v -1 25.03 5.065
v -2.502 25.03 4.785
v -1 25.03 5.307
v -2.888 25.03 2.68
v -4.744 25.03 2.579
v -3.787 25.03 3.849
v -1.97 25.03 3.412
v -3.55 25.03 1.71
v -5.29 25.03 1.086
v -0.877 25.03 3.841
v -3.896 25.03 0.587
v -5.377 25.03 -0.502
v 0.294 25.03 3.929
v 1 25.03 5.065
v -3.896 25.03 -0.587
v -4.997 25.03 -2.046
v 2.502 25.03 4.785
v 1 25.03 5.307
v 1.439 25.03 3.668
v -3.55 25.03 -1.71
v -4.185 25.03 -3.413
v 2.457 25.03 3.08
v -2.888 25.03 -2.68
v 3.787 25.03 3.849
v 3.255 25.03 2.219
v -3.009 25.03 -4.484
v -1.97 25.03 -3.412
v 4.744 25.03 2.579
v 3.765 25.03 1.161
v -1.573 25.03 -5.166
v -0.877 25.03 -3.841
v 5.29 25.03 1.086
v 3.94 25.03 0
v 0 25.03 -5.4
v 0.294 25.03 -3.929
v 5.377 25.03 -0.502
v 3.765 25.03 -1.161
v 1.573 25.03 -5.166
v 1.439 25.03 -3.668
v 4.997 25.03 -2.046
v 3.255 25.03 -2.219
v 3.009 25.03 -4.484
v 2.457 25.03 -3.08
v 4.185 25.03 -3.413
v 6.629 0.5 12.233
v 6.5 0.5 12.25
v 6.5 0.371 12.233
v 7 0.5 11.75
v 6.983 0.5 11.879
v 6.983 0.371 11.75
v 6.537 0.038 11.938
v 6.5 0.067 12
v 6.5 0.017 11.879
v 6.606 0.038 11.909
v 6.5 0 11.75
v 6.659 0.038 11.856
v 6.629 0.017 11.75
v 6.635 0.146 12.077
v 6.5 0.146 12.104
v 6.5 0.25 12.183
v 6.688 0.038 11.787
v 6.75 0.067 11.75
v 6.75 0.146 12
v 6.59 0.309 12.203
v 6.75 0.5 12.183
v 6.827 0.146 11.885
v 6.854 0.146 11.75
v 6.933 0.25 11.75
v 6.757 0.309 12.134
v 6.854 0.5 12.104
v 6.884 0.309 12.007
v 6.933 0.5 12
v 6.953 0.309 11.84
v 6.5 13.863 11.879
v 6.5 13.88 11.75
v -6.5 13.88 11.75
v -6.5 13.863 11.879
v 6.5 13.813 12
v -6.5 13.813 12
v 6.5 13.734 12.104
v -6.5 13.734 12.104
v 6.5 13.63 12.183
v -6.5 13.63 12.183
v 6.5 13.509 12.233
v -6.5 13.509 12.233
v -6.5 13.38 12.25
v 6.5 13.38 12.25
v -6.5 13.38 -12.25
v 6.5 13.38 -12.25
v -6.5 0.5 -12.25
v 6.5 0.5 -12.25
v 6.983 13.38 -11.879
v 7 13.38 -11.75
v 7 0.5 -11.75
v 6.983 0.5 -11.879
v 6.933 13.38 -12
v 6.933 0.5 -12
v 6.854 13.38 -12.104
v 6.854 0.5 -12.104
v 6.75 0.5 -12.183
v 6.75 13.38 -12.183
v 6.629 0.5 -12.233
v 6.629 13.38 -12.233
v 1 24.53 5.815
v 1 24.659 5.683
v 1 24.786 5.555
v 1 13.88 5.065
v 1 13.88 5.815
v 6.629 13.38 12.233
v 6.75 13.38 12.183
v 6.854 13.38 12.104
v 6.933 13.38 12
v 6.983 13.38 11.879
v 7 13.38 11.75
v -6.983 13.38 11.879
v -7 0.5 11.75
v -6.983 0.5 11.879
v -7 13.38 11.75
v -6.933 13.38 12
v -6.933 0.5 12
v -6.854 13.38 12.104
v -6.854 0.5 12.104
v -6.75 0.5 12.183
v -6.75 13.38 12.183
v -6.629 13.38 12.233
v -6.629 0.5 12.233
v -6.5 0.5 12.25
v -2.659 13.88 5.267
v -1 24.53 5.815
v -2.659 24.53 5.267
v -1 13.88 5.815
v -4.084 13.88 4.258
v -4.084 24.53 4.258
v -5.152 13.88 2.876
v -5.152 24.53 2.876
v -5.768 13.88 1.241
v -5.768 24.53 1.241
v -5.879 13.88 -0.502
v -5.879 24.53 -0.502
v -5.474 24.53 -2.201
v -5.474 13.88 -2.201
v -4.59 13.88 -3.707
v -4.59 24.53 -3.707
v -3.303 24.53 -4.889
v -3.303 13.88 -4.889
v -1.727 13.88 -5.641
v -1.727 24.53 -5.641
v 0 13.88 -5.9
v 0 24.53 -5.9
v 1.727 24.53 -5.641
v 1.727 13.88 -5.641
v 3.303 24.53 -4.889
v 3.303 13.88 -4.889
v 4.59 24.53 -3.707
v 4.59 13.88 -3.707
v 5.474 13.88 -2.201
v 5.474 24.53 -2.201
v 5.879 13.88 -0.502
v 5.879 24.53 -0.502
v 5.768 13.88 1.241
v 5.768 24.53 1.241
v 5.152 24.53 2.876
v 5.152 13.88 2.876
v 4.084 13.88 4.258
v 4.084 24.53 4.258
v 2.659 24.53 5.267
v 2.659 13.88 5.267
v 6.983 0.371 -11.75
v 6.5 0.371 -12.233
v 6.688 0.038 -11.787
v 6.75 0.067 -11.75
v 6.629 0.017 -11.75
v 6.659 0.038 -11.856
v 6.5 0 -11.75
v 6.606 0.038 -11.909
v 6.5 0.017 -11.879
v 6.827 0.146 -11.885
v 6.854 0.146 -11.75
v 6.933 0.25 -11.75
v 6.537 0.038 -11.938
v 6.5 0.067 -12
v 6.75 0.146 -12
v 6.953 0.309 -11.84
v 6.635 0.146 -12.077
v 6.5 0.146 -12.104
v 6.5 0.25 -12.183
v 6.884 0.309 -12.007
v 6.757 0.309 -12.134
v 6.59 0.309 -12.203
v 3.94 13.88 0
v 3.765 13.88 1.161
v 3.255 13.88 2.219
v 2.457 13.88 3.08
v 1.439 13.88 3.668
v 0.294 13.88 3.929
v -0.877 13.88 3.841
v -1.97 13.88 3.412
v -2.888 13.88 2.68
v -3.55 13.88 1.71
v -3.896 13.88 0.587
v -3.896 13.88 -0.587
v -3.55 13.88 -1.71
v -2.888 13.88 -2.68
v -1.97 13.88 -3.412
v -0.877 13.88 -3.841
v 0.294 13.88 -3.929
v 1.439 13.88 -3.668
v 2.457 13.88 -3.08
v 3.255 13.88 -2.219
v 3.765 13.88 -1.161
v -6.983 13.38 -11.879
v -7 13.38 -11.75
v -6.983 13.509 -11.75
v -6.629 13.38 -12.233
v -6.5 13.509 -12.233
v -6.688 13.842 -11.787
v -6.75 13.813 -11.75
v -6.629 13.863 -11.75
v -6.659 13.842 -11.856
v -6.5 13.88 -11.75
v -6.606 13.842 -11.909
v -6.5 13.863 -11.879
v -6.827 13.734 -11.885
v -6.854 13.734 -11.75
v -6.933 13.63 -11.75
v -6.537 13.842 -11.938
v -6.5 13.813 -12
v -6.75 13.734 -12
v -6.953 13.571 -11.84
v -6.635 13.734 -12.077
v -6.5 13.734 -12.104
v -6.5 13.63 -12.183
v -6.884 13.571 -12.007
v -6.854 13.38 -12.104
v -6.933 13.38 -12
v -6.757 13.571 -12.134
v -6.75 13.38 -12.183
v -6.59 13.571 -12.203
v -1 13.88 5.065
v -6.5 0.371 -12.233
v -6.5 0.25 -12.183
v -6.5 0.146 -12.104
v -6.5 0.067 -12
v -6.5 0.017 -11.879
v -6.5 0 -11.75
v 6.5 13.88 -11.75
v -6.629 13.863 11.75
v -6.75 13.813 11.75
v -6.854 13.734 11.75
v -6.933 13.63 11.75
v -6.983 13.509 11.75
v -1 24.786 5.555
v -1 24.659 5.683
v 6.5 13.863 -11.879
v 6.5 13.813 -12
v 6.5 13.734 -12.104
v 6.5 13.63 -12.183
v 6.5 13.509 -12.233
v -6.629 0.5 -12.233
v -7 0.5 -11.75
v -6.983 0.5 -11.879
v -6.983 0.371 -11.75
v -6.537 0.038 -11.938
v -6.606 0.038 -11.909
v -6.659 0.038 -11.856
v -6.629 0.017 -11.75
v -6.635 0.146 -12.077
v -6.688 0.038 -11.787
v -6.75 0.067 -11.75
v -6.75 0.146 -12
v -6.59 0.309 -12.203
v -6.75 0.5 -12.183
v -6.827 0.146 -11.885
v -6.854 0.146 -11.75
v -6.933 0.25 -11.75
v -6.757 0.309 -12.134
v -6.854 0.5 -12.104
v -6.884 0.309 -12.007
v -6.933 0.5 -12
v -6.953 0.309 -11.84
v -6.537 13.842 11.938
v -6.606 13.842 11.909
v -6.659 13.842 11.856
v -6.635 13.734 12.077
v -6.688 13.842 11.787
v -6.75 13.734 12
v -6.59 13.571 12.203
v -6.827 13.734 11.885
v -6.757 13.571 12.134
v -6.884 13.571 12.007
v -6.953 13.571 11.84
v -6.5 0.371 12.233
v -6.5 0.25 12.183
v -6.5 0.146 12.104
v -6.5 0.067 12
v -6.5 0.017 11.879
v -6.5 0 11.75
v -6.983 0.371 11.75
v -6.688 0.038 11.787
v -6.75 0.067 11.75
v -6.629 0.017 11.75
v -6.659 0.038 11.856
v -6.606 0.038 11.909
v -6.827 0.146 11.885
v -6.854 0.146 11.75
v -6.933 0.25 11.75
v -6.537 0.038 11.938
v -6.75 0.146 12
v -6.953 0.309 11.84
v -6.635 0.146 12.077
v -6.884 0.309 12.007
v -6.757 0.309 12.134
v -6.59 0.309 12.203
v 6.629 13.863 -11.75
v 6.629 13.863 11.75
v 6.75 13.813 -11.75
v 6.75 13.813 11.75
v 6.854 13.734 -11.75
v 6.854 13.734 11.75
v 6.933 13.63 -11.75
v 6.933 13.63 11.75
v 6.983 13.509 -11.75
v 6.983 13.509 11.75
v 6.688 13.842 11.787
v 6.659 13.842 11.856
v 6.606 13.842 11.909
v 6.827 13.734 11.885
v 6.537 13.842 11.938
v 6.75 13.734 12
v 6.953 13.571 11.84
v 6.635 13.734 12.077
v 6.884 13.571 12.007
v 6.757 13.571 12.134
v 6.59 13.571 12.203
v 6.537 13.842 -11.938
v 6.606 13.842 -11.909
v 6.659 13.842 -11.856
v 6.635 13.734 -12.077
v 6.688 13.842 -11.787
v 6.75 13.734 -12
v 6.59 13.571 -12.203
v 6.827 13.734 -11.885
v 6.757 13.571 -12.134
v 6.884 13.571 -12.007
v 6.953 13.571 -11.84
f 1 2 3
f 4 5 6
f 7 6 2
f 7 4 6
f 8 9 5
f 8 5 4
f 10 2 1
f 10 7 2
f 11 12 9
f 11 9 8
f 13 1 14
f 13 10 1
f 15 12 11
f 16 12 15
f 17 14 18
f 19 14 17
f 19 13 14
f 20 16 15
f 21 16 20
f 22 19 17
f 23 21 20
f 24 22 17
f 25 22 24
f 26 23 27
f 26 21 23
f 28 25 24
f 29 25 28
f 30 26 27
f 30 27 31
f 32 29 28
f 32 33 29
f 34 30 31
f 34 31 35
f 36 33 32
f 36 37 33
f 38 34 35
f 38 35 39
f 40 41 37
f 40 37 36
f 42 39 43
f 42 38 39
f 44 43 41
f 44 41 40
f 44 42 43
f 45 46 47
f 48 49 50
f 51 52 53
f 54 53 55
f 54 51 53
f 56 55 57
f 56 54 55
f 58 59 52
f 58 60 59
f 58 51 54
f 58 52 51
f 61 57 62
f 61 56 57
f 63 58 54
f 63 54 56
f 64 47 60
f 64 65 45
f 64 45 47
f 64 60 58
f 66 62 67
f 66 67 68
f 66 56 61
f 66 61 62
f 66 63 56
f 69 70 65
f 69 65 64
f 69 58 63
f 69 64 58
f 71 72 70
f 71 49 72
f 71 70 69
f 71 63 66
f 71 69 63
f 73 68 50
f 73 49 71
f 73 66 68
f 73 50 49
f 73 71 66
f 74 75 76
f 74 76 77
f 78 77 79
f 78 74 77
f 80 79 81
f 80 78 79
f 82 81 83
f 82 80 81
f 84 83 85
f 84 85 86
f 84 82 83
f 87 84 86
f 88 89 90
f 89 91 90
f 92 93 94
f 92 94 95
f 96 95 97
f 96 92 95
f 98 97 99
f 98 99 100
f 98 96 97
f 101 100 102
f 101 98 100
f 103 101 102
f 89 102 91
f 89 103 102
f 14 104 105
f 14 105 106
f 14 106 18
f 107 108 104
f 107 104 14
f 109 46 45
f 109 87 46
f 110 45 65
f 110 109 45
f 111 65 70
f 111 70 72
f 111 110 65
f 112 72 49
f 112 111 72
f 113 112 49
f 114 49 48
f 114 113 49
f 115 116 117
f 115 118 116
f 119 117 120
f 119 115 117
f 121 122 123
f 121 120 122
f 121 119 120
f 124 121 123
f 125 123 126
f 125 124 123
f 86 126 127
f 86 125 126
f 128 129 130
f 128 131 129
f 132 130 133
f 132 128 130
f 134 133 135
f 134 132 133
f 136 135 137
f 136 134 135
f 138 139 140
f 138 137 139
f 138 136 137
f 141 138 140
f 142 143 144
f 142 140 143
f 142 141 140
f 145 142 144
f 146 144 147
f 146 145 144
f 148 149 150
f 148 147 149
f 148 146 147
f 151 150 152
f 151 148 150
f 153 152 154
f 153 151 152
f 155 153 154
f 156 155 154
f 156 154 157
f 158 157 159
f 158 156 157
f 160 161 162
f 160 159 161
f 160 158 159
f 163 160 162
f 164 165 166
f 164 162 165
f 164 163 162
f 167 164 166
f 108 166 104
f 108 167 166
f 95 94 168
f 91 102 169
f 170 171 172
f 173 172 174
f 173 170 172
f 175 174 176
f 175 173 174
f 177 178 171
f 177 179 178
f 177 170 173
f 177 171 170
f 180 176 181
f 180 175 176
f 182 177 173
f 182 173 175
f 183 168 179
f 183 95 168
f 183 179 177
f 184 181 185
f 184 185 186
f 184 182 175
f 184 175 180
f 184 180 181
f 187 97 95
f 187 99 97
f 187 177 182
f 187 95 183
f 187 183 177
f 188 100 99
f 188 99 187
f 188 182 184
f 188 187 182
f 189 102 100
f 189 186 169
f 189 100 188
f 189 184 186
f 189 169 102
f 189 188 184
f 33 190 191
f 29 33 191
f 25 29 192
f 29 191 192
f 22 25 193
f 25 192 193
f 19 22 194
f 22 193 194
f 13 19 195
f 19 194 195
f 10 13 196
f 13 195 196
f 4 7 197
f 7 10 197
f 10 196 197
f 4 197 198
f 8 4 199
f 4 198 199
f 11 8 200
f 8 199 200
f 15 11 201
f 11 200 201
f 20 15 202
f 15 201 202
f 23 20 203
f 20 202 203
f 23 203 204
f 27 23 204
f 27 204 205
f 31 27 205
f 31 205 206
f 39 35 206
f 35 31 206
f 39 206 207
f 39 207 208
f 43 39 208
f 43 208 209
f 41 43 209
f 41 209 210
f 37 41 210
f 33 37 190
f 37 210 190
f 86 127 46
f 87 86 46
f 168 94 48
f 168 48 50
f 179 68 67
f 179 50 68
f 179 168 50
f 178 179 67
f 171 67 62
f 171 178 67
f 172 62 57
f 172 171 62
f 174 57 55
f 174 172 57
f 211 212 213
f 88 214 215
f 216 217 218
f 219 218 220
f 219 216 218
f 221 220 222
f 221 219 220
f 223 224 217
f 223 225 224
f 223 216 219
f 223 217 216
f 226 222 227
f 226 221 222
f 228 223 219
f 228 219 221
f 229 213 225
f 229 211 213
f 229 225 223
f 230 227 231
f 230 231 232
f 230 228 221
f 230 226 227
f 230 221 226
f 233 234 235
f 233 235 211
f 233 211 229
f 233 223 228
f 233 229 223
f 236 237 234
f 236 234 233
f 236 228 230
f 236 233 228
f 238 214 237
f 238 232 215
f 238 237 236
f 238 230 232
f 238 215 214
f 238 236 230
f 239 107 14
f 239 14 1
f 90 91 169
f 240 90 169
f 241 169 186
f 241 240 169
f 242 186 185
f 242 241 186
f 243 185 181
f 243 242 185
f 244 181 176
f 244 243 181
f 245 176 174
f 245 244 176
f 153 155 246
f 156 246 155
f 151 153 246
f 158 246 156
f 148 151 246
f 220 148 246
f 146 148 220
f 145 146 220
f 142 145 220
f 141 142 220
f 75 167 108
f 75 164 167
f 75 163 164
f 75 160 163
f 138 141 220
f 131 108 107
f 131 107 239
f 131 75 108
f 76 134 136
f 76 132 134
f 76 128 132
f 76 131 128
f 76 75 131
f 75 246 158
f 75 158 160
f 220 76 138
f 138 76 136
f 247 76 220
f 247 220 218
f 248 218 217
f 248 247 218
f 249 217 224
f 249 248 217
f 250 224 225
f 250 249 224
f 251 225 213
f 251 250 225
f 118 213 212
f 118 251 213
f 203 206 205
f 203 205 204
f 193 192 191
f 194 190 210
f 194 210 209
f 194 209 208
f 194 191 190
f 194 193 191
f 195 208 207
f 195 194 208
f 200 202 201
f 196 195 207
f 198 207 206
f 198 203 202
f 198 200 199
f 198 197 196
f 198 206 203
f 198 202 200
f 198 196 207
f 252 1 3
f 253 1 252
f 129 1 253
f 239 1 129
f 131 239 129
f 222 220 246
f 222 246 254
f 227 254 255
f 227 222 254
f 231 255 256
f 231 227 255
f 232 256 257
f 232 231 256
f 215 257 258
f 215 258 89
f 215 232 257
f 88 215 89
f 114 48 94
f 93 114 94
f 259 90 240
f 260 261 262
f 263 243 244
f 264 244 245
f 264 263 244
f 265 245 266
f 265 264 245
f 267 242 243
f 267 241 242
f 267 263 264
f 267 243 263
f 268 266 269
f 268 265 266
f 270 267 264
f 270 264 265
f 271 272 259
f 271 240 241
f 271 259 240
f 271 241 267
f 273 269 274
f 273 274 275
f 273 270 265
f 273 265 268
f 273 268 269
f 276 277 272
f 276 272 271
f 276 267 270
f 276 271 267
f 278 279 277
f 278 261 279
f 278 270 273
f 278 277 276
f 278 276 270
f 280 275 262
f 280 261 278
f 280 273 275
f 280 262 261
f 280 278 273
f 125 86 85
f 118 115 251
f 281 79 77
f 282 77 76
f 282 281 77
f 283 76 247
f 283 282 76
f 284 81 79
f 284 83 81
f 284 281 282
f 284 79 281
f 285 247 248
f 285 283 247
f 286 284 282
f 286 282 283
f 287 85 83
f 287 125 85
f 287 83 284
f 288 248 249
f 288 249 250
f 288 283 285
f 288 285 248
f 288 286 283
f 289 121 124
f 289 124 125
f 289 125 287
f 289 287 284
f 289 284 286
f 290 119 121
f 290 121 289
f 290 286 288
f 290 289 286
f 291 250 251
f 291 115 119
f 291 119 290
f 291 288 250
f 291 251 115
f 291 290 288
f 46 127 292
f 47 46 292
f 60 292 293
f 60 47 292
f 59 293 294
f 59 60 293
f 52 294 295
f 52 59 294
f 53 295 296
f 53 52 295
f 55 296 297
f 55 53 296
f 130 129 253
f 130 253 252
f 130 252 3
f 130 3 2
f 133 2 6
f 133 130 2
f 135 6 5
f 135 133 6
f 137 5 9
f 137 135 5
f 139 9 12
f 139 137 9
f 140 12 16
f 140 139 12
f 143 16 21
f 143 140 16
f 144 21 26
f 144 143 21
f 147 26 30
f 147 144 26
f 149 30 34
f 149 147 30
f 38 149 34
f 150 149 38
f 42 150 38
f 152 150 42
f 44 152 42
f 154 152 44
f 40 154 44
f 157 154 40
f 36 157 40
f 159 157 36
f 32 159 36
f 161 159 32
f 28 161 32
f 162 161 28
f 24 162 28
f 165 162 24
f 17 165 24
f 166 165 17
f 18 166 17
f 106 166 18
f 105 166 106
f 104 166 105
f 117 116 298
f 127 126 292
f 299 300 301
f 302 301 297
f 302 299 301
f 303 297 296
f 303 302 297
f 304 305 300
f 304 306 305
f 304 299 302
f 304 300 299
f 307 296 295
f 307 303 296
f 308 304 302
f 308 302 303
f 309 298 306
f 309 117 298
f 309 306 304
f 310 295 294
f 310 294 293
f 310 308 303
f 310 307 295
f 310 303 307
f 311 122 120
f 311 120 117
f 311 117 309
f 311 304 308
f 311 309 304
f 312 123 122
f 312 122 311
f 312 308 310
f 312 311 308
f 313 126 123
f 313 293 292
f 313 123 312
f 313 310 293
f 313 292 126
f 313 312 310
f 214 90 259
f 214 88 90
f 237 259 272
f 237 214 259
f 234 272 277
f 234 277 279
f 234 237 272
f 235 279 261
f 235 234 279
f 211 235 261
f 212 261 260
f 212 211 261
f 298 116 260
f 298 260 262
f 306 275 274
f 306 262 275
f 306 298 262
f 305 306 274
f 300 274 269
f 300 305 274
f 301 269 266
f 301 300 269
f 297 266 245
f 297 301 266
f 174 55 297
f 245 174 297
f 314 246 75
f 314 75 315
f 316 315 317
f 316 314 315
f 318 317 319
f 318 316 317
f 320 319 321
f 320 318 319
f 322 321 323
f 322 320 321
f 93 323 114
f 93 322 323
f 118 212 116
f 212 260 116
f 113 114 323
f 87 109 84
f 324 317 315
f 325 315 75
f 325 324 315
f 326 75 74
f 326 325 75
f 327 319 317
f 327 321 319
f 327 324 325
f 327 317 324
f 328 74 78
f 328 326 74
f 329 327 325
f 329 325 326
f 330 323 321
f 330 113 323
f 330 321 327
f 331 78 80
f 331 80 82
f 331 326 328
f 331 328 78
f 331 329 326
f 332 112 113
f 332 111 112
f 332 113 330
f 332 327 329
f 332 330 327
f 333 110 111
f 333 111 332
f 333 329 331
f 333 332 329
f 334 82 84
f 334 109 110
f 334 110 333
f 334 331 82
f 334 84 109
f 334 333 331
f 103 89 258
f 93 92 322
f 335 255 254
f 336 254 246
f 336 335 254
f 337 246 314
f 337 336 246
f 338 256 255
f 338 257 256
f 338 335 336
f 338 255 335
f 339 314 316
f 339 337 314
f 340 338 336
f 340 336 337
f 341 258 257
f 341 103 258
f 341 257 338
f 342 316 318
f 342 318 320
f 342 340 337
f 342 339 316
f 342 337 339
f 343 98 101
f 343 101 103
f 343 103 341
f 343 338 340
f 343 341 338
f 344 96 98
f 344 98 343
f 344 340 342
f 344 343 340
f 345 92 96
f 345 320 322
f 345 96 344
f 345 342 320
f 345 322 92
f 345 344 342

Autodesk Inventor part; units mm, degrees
ref_plane "YZ Plane" through (0, 0, 0) normal (1, 0, 0) x (0, 1, 0)
ref_plane "XZ Plane" through (0, 0, 0) normal (0, 1, 0) x (-1, 0, 0)
ref_plane "XY Plane" through (0, 0, 0) normal (0, 0, 1) x (1, 0, 0)
sketch "Sketch1" plane through (0, 0, 0) normal (0, 1, 0) x (-1, 0, 0)
  line L0 (7, 12.25) -> (-7, 12.25)
  line L1 (-7, 12.25) -> (-7, -12.25)
  line L2 (-7, -12.25) -> (7, -12.25)
  line L3 (7, -12.25) -> (7, 12.25)
  line L4 (7, 0) -> (-7, 0) construction
  point P0 (0, 0)
  point P1 (0, 0)
  dimension "d0" = 14
  dimension "d1" = 24.5
extrude "Extrusion1" add sketch "Sketch1" along normal blind 13.88
fillet "Fillet1" radius 0.5 12 edges at (7, 6.94, 12.25) (-7, 6.94, 12.25) (-7, 6.94, -12.25) (7, 6.94, -12.25) (7, 13.88, 0) (0, 13.88, -12.25) (-7, 13.88, 0) (0, 13.88, 12.25) (0, 0, 12.25) (7, 0, 0) (0, 0, -12.25) (-7, 0, 0)
sketch "Sketch2" plane through (0, 13.88, 0) normal (0, 1, 0) x (1, 0, 0)
  arc A0 (1, -5.8146) -> (-1, -5.8146) centre (0, 0) ccw
  circle A1 centre (0, 0) radius 3.94
  line L0 (1, -5.8146) -> (1, -5.0646)
  line L1 (1, -5.0646) -> (-1, -5.0646)
  line L2 (-1, -5.0646) -> (-1, -5.8146)
  line L3 (0, 0) -> (0, -5.0646) construction
  dimension "d5" = 11.8
  dimension "d8" = 7.88
  dimension "d9" = 0.75
  dimension "d10" = 2
extrude "Extrusion3" add sketch "Sketch2" along normal blind 11.15
chamfer "Chamfer1" distance 0.5 angle 45 1 edges at (0, 25.03, -5.9)
thread "Thread1" size "M12x1" class "6g" standard "ANSI Metric M Profile" full length
properties part number "Toggle_Base" material "PC/ABS Plastic"
